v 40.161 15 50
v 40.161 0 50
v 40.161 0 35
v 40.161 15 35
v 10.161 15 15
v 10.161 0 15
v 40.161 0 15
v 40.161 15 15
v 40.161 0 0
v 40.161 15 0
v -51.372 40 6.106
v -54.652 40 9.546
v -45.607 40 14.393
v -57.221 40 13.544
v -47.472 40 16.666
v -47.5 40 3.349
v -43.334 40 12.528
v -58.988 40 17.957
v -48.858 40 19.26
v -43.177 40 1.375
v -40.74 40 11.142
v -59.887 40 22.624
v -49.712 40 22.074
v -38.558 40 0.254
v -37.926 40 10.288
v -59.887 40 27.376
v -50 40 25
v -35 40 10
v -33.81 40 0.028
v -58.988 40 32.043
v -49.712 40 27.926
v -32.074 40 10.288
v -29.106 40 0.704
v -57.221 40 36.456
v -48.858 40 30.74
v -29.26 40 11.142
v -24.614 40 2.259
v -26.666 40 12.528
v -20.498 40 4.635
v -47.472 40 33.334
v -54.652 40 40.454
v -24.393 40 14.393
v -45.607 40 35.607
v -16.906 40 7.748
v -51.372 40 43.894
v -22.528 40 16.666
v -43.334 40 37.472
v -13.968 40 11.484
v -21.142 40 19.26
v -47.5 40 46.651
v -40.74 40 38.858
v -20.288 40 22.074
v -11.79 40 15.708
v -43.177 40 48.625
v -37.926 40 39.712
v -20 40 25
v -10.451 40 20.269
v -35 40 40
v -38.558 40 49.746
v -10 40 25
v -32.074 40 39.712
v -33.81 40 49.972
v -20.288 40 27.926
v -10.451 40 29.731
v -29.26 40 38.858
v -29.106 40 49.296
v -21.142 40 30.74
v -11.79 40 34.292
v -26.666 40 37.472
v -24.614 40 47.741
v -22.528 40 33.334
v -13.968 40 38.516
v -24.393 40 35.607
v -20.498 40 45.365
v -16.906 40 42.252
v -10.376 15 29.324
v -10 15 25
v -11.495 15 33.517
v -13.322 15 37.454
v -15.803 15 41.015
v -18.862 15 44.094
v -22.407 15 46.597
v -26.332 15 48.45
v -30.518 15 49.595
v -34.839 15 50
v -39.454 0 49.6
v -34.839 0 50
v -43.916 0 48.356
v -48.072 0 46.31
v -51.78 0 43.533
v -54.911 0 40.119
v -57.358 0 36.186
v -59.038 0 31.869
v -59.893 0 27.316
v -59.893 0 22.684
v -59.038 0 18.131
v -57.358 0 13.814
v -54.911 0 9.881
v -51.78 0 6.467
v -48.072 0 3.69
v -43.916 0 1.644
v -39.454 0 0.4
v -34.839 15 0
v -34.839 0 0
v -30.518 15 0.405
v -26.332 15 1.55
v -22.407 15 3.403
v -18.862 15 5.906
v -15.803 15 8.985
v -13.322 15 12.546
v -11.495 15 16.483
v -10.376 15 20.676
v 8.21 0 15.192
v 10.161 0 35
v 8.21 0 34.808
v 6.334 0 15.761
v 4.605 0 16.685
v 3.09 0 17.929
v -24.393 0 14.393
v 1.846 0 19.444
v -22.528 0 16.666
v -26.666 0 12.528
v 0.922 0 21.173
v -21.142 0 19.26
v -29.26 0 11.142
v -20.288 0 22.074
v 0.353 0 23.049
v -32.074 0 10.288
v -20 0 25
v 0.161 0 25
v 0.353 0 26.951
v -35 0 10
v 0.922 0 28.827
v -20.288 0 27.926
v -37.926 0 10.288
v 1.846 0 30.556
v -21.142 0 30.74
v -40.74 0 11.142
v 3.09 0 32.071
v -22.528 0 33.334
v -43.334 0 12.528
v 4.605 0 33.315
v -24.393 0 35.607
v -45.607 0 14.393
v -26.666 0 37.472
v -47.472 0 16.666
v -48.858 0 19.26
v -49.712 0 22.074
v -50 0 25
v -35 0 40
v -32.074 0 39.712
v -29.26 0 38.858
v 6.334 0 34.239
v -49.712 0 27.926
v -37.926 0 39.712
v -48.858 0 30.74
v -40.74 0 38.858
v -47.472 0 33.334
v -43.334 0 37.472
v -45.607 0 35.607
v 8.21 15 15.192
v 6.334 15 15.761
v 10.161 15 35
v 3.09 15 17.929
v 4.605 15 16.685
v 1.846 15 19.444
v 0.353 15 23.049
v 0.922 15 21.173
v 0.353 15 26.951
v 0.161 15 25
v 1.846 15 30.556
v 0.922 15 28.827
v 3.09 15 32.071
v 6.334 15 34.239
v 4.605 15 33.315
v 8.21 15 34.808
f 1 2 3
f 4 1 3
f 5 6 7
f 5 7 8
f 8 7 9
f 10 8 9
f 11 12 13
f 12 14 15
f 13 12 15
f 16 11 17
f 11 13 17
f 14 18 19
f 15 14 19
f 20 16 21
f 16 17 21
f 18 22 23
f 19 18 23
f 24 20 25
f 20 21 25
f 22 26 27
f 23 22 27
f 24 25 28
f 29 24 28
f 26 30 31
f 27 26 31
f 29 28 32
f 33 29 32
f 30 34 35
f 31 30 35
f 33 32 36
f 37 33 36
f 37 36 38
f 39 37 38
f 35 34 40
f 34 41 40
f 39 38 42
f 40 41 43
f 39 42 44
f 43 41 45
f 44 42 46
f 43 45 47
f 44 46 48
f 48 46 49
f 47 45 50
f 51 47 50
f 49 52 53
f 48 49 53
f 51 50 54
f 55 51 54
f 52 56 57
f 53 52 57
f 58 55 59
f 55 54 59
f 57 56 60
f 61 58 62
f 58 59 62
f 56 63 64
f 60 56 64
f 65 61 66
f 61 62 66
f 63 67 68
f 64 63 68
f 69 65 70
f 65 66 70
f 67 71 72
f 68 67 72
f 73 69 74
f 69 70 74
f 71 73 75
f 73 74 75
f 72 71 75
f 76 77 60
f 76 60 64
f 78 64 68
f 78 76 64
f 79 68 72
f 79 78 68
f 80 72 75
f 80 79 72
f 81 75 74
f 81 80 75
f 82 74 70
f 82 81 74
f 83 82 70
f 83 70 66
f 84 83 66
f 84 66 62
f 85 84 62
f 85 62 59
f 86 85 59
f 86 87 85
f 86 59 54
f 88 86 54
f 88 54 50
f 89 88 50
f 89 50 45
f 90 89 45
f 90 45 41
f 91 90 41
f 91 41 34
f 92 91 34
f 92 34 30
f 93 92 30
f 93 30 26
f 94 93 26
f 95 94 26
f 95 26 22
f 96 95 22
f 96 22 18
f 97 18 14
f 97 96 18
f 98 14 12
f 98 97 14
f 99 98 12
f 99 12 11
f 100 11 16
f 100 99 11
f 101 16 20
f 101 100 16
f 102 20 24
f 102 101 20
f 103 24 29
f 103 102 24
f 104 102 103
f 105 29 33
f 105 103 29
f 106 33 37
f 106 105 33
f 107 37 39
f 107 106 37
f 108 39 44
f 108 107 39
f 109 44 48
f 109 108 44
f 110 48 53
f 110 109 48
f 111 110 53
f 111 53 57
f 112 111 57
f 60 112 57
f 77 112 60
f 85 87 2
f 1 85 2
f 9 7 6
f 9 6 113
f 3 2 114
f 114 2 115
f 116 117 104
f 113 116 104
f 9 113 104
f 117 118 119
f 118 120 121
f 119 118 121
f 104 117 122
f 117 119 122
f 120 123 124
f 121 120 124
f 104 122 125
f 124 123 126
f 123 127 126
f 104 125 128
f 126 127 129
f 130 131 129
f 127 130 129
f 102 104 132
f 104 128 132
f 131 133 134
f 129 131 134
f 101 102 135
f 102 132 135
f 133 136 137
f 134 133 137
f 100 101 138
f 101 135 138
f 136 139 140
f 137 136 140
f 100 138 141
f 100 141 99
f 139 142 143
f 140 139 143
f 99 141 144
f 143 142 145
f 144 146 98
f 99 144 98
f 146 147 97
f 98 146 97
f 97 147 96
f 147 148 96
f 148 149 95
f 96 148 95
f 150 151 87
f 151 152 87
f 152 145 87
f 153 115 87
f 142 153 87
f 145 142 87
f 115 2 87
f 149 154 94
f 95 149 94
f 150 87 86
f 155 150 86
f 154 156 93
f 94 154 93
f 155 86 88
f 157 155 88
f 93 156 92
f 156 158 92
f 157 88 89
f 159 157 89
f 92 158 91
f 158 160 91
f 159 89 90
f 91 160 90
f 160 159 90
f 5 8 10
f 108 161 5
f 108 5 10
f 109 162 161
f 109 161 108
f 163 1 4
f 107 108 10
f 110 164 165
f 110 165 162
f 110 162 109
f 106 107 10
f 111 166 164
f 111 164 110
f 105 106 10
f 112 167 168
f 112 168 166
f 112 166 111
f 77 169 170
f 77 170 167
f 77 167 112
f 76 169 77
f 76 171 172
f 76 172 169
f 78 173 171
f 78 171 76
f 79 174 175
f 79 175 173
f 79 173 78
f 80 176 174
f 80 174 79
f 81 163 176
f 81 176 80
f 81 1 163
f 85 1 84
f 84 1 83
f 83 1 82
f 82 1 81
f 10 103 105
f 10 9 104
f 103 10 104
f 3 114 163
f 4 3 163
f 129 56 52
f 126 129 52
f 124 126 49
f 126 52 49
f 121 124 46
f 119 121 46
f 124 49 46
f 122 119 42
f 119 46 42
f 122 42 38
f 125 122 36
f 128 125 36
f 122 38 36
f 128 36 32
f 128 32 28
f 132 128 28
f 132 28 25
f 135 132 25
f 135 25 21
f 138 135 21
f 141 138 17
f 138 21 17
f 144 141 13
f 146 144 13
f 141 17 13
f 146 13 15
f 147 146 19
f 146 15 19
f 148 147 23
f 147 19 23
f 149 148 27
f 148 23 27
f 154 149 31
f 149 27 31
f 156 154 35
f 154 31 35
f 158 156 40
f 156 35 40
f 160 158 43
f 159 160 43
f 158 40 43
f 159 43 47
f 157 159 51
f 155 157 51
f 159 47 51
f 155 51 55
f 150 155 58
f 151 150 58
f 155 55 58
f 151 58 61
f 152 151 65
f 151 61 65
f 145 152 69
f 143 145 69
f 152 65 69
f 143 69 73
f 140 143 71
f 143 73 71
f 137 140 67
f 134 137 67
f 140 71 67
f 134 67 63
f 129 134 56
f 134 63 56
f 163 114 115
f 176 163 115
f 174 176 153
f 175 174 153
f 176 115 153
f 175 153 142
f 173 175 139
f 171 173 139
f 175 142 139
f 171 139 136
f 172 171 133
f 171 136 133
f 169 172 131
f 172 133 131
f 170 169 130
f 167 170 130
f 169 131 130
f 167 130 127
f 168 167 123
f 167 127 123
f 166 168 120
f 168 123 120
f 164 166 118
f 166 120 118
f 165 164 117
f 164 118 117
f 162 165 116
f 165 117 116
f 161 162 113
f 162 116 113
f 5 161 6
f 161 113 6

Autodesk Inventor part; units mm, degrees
ref_plane "YZ Plane" through (0, 0, 0) normal (1, 0, 0) x (0, 1, 0)
ref_plane "XZ Plane" through (0, 0, 0) normal (0, 1, 0) x (-1, 0, 0)
ref_plane "XY Plane" through (0, 0, 0) normal (0, 0, 1) x (1, 0, 0)
sketch "Sketch4" plane through (0, 0, 0) normal (0, 1, 0) x (-1, 0, 0)
  line L0 (-40.1608, 0) -> (34.8392, 0)
  line L1 (34.8392, 0) -> (34.8392, 50)
  line L2 (34.8392, 50) -> (-40.1608, 50)
  line L3 (-40.1608, 50) -> (-40.1608, 0)
  point P0 (0, 0)
  point P1 (0, 0)
  dimension "d3" = 75
  dimension "d4" = 50
extrude "Extrusion1" add sketch "Sketch4" along normal blind 15
sketch "Sketch5" plane through (0, 0, 0) normal (0, -1, 0) x (1, 0, 0)
  point P0 (0, 0)
sketch "Sketch7" plane through (0, 0, 0) normal (0, -1, 0) x (1, 0, 0)
  line L0 (-34.8392, 0) -> (-34.8392, 50) projected
  circle A0 centre (-35, 25) radius 25.0005
  point P0 (0, 0)
extrude "Extrusion3" add sketch "Sketch7" against normal blind 40
sketch "Sketch8" plane through (-35, 40, 25) normal (0, 1, 0) x (1, 0, 0)
  circle A0 centre (0, 0) radius 15
  point P0 (35, 25)
  dimension "d11" = 30
extrude "Extrusion4" cut sketch "Sketch8" against normal through all
sketch "Sketch9" plane through (0, 15, 0) normal (0, 1, 0) x (1, 0, 0)
  line L0 (40.1608, -50) -> (40.1608, 0) projected
  line L1 (40.1608, 0) -> (-34.8392, 0) projected
  point P0 (0, 0)
  point P1 (10.1608, -25)
  dimension "d14" = 30
  dimension "d15" = 25
hole "Hole1" at (10.1608, 15, 25) direction (0, -1, 0) diameter 20 end through all
sketch "Sketch10" plane through (40.1608, 0, 50) normal (1, 0, 0) x (0, 0, -1)
  line L0 (15, 0) -> (15, 15) projected
  line L1 (15, 0) -> (35, 0)
  line L2 (35, 0) -> (35, 15)
  line L3 (35, 15) -> (15, 15)
  line L4 (15, 15) -> (15, 0)
  point P0 (50, 0)
extrude "Extrusion5" cut sketch "Sketch10" against normal up to surface
properties part number "Assignment 3 - Locator"
